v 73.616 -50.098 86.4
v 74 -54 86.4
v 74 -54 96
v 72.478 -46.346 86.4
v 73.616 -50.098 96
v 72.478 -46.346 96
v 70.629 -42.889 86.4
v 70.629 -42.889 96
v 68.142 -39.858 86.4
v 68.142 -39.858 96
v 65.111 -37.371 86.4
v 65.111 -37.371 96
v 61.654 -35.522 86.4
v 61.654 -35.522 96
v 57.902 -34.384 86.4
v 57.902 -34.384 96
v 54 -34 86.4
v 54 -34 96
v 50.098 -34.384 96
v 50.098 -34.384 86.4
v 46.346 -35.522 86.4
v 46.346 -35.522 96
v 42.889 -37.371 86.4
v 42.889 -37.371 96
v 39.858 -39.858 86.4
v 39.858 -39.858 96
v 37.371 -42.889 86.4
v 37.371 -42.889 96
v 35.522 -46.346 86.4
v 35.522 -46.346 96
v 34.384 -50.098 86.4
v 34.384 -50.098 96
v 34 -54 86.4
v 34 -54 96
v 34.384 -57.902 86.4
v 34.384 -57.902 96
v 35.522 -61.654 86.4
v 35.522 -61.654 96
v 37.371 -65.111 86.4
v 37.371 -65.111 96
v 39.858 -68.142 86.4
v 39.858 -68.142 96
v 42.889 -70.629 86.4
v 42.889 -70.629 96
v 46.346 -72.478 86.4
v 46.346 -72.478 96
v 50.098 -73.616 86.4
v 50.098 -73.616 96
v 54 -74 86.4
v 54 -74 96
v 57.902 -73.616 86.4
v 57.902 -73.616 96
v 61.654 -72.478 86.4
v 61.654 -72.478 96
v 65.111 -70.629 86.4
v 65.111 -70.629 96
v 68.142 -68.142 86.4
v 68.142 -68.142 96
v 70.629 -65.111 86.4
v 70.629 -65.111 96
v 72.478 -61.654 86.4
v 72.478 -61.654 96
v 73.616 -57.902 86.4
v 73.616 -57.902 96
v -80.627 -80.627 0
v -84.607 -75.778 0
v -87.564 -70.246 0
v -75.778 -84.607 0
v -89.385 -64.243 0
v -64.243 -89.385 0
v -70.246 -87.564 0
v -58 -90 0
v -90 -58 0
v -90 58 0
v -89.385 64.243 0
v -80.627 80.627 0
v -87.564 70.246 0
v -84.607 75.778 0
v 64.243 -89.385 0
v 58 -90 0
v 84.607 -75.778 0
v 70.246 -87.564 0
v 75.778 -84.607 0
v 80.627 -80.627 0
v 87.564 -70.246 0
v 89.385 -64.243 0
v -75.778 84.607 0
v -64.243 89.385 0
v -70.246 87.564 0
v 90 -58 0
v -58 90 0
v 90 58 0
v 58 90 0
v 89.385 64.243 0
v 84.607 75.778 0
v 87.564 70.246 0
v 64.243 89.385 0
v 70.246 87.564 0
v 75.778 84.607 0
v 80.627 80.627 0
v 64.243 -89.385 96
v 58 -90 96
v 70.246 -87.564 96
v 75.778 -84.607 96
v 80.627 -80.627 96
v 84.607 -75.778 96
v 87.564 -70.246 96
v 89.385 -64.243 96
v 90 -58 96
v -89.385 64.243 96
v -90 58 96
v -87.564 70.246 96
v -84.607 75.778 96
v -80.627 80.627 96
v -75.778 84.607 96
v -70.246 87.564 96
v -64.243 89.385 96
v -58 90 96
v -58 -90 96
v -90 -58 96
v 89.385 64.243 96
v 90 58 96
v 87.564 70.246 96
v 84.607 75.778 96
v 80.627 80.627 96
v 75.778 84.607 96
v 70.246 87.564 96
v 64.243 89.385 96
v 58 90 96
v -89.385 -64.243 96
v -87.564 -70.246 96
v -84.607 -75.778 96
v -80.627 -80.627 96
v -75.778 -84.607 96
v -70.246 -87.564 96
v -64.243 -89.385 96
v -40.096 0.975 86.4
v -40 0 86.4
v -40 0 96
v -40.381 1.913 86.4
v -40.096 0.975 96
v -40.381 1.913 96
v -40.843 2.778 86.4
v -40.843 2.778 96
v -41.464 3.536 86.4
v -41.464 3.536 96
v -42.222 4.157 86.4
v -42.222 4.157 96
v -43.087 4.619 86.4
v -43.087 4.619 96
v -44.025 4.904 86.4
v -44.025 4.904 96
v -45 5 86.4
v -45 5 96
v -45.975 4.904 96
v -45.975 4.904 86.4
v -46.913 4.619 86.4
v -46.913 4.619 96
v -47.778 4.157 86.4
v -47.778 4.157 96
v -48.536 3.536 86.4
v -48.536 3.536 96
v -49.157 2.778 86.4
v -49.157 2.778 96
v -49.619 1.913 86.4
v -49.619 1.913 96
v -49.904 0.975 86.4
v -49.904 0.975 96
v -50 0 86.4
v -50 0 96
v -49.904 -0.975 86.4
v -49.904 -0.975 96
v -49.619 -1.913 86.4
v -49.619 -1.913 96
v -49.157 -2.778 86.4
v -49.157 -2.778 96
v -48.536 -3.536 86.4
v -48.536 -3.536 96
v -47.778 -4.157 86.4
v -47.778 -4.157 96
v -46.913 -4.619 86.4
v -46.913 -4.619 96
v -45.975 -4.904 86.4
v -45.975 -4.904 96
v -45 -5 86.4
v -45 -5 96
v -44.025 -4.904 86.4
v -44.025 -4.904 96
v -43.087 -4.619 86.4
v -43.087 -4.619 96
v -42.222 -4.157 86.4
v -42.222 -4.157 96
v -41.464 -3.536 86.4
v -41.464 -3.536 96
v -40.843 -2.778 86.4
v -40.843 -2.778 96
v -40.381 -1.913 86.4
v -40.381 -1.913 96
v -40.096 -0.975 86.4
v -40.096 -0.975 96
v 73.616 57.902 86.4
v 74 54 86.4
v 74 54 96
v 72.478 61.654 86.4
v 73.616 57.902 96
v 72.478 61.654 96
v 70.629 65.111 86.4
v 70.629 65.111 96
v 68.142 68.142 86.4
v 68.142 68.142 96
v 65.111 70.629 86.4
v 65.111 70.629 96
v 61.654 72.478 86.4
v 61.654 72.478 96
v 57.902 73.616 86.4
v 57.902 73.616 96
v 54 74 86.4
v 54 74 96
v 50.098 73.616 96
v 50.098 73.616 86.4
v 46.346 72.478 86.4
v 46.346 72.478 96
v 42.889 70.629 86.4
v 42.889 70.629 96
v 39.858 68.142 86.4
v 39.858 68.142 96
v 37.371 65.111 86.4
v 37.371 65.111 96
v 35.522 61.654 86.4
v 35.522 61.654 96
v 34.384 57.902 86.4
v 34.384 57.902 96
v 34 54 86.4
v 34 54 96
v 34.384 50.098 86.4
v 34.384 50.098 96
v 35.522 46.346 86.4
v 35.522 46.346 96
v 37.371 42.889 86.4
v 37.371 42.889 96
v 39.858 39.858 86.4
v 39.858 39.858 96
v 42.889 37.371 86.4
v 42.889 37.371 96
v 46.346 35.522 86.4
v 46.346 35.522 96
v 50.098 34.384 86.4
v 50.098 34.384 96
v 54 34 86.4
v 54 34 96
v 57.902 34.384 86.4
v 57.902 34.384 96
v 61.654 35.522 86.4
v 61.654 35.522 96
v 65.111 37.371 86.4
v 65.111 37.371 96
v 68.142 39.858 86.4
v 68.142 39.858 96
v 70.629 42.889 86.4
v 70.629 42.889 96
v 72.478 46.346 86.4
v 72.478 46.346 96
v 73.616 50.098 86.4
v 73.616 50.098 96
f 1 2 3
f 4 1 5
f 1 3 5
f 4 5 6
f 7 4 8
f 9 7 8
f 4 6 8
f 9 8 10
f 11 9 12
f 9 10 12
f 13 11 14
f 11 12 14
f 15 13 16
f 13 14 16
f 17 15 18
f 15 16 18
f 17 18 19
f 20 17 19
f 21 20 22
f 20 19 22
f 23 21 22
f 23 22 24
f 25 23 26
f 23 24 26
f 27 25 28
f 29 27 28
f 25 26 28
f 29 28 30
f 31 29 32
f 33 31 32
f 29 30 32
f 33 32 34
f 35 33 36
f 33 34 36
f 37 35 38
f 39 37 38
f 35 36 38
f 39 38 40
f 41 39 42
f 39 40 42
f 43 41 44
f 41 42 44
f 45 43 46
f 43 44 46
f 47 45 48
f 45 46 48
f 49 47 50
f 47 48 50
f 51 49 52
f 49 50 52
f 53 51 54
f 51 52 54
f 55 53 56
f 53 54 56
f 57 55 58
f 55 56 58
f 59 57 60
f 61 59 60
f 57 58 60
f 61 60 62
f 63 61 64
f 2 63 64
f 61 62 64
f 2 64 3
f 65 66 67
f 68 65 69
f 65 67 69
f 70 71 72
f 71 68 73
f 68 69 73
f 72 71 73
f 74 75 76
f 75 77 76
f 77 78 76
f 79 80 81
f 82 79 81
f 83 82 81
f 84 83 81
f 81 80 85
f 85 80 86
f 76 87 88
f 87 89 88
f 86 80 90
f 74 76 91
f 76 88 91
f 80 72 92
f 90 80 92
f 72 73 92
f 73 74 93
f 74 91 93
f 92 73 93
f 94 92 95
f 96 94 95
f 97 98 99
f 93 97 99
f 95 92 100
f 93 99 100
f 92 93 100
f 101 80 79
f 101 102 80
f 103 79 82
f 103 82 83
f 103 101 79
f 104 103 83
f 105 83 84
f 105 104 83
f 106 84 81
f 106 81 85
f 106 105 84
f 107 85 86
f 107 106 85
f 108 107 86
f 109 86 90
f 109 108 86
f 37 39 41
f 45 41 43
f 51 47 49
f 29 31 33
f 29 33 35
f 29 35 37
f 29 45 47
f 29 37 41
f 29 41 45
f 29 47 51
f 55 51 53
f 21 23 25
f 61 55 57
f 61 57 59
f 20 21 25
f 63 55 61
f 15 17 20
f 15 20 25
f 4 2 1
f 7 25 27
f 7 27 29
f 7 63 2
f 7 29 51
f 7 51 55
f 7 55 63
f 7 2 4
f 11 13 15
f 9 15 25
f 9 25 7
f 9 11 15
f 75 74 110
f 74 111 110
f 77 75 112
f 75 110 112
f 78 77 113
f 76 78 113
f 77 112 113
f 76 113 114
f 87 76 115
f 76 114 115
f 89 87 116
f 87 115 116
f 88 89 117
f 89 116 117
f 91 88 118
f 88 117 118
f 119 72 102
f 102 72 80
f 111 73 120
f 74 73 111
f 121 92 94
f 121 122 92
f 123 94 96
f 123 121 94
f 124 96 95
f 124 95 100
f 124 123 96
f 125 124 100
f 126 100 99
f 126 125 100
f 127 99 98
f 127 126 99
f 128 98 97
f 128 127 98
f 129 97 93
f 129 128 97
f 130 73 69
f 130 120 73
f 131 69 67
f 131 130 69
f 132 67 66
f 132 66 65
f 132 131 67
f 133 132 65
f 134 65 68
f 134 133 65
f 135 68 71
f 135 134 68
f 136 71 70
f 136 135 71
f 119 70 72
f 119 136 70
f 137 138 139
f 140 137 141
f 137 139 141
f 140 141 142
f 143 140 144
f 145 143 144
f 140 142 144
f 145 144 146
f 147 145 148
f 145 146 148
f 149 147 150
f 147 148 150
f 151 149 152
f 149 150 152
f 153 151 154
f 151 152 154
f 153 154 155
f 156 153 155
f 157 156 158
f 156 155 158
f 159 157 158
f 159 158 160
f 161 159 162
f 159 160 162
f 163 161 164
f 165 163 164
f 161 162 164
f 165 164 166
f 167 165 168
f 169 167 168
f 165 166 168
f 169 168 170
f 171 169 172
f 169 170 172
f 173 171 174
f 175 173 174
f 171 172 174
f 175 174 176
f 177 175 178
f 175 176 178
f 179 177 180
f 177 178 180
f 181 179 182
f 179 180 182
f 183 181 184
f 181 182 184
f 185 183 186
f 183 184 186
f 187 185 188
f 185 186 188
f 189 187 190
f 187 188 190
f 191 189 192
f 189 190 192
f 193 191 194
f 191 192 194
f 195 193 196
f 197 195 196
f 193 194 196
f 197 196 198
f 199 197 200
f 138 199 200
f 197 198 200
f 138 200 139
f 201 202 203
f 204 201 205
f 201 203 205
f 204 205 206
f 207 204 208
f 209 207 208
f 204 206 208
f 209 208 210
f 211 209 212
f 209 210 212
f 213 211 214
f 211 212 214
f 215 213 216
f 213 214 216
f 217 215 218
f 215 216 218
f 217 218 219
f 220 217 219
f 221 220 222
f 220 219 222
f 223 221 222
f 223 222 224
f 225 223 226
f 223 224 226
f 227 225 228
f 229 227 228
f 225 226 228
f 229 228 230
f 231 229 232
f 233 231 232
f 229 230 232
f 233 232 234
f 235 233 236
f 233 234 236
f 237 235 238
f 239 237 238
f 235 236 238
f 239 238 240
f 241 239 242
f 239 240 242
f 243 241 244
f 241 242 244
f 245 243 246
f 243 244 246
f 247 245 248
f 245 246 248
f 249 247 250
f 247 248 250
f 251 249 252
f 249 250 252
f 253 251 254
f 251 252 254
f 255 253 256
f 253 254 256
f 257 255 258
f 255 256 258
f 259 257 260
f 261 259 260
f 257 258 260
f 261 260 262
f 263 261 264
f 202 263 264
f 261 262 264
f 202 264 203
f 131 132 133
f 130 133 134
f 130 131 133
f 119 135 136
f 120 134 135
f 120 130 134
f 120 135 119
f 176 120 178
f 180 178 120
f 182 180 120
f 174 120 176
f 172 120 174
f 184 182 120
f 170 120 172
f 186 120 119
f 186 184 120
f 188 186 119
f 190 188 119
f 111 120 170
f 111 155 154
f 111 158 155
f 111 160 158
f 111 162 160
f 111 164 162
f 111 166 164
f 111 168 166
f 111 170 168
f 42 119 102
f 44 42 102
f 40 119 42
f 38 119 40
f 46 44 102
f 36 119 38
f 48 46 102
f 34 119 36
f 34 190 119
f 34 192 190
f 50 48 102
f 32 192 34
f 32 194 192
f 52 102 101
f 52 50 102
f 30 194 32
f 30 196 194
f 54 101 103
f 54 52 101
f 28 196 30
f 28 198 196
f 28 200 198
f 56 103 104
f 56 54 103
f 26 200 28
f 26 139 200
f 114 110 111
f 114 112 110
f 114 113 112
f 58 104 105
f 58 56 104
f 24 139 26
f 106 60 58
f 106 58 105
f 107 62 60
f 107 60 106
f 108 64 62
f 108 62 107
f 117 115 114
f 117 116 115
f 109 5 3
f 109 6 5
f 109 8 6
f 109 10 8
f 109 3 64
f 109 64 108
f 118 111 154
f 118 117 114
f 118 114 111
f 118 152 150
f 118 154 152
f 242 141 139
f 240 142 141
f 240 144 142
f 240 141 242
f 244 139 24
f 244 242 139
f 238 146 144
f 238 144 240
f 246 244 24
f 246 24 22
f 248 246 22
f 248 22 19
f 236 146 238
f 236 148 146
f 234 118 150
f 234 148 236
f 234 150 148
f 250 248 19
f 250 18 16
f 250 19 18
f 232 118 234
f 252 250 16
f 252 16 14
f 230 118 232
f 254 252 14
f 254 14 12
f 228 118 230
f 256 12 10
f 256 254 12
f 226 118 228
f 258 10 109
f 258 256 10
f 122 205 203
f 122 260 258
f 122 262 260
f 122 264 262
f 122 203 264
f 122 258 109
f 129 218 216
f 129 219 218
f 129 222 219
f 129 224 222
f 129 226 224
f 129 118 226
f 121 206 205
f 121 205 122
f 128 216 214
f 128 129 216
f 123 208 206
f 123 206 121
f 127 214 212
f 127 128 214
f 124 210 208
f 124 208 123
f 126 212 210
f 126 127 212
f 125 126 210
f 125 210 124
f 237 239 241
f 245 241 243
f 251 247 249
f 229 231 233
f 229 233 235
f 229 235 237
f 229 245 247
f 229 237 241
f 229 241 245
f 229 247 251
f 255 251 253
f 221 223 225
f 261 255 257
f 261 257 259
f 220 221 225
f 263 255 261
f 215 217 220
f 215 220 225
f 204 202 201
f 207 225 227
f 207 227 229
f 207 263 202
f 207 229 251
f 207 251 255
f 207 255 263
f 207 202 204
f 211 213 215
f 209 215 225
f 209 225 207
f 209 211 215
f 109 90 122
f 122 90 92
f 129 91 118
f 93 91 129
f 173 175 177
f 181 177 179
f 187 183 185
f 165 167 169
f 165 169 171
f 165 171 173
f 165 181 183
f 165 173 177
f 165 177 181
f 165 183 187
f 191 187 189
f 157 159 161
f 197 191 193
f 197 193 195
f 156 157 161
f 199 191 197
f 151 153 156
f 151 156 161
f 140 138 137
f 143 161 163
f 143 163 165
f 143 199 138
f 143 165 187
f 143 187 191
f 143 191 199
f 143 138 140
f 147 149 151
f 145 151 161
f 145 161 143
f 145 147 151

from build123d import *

# Parameters (mm, degrees)
ESQUISSE1_W             = 180
ESQUISSE1_H             = 180
BOSS_EXTRU_1_DEPTH      = 96
CONG_1_R                = 32
ESQUISSE2_R             = 20
ESQUISSE2_R_2           = 5
ENL_V_MAT_EXTRU_1_DEPTH = 9.6


with BuildPart() as part:
    # Esquisse1 → Boss.-Extru.1 (new body)
    with BuildSketch(Plane.XY):
        Rectangle(ESQUISSE1_W, ESQUISSE1_H)
    extrude(amount=BOSS_EXTRU_1_DEPTH)

    # Congé1
    cong_1_edges = [part.edges().sort_by_distance(p)[0] for p in [
        (90, -90, 48),
        (-90, -90, 48),
        (-90, 90, 48),
        (90, 90, 48),
    ]]
    fillet(cong_1_edges, radius=CONG_1_R)

    # Esquisse2 → Enlèv. mat.-Extru.1 (cut)
    with BuildSketch(Plane.XY.offset(96)):
        with Locations((54, 54)):
            Circle(ESQUISSE2_R)
        with Locations((54, -54)):
            Circle(ESQUISSE2_R)
        with Locations((-45, 0)):
            Circle(ESQUISSE2_R_2)
    extrude(amount=-ENL_V_MAT_EXTRU_1_DEPTH, mode=Mode.SUBTRACT)


solid = part.part
